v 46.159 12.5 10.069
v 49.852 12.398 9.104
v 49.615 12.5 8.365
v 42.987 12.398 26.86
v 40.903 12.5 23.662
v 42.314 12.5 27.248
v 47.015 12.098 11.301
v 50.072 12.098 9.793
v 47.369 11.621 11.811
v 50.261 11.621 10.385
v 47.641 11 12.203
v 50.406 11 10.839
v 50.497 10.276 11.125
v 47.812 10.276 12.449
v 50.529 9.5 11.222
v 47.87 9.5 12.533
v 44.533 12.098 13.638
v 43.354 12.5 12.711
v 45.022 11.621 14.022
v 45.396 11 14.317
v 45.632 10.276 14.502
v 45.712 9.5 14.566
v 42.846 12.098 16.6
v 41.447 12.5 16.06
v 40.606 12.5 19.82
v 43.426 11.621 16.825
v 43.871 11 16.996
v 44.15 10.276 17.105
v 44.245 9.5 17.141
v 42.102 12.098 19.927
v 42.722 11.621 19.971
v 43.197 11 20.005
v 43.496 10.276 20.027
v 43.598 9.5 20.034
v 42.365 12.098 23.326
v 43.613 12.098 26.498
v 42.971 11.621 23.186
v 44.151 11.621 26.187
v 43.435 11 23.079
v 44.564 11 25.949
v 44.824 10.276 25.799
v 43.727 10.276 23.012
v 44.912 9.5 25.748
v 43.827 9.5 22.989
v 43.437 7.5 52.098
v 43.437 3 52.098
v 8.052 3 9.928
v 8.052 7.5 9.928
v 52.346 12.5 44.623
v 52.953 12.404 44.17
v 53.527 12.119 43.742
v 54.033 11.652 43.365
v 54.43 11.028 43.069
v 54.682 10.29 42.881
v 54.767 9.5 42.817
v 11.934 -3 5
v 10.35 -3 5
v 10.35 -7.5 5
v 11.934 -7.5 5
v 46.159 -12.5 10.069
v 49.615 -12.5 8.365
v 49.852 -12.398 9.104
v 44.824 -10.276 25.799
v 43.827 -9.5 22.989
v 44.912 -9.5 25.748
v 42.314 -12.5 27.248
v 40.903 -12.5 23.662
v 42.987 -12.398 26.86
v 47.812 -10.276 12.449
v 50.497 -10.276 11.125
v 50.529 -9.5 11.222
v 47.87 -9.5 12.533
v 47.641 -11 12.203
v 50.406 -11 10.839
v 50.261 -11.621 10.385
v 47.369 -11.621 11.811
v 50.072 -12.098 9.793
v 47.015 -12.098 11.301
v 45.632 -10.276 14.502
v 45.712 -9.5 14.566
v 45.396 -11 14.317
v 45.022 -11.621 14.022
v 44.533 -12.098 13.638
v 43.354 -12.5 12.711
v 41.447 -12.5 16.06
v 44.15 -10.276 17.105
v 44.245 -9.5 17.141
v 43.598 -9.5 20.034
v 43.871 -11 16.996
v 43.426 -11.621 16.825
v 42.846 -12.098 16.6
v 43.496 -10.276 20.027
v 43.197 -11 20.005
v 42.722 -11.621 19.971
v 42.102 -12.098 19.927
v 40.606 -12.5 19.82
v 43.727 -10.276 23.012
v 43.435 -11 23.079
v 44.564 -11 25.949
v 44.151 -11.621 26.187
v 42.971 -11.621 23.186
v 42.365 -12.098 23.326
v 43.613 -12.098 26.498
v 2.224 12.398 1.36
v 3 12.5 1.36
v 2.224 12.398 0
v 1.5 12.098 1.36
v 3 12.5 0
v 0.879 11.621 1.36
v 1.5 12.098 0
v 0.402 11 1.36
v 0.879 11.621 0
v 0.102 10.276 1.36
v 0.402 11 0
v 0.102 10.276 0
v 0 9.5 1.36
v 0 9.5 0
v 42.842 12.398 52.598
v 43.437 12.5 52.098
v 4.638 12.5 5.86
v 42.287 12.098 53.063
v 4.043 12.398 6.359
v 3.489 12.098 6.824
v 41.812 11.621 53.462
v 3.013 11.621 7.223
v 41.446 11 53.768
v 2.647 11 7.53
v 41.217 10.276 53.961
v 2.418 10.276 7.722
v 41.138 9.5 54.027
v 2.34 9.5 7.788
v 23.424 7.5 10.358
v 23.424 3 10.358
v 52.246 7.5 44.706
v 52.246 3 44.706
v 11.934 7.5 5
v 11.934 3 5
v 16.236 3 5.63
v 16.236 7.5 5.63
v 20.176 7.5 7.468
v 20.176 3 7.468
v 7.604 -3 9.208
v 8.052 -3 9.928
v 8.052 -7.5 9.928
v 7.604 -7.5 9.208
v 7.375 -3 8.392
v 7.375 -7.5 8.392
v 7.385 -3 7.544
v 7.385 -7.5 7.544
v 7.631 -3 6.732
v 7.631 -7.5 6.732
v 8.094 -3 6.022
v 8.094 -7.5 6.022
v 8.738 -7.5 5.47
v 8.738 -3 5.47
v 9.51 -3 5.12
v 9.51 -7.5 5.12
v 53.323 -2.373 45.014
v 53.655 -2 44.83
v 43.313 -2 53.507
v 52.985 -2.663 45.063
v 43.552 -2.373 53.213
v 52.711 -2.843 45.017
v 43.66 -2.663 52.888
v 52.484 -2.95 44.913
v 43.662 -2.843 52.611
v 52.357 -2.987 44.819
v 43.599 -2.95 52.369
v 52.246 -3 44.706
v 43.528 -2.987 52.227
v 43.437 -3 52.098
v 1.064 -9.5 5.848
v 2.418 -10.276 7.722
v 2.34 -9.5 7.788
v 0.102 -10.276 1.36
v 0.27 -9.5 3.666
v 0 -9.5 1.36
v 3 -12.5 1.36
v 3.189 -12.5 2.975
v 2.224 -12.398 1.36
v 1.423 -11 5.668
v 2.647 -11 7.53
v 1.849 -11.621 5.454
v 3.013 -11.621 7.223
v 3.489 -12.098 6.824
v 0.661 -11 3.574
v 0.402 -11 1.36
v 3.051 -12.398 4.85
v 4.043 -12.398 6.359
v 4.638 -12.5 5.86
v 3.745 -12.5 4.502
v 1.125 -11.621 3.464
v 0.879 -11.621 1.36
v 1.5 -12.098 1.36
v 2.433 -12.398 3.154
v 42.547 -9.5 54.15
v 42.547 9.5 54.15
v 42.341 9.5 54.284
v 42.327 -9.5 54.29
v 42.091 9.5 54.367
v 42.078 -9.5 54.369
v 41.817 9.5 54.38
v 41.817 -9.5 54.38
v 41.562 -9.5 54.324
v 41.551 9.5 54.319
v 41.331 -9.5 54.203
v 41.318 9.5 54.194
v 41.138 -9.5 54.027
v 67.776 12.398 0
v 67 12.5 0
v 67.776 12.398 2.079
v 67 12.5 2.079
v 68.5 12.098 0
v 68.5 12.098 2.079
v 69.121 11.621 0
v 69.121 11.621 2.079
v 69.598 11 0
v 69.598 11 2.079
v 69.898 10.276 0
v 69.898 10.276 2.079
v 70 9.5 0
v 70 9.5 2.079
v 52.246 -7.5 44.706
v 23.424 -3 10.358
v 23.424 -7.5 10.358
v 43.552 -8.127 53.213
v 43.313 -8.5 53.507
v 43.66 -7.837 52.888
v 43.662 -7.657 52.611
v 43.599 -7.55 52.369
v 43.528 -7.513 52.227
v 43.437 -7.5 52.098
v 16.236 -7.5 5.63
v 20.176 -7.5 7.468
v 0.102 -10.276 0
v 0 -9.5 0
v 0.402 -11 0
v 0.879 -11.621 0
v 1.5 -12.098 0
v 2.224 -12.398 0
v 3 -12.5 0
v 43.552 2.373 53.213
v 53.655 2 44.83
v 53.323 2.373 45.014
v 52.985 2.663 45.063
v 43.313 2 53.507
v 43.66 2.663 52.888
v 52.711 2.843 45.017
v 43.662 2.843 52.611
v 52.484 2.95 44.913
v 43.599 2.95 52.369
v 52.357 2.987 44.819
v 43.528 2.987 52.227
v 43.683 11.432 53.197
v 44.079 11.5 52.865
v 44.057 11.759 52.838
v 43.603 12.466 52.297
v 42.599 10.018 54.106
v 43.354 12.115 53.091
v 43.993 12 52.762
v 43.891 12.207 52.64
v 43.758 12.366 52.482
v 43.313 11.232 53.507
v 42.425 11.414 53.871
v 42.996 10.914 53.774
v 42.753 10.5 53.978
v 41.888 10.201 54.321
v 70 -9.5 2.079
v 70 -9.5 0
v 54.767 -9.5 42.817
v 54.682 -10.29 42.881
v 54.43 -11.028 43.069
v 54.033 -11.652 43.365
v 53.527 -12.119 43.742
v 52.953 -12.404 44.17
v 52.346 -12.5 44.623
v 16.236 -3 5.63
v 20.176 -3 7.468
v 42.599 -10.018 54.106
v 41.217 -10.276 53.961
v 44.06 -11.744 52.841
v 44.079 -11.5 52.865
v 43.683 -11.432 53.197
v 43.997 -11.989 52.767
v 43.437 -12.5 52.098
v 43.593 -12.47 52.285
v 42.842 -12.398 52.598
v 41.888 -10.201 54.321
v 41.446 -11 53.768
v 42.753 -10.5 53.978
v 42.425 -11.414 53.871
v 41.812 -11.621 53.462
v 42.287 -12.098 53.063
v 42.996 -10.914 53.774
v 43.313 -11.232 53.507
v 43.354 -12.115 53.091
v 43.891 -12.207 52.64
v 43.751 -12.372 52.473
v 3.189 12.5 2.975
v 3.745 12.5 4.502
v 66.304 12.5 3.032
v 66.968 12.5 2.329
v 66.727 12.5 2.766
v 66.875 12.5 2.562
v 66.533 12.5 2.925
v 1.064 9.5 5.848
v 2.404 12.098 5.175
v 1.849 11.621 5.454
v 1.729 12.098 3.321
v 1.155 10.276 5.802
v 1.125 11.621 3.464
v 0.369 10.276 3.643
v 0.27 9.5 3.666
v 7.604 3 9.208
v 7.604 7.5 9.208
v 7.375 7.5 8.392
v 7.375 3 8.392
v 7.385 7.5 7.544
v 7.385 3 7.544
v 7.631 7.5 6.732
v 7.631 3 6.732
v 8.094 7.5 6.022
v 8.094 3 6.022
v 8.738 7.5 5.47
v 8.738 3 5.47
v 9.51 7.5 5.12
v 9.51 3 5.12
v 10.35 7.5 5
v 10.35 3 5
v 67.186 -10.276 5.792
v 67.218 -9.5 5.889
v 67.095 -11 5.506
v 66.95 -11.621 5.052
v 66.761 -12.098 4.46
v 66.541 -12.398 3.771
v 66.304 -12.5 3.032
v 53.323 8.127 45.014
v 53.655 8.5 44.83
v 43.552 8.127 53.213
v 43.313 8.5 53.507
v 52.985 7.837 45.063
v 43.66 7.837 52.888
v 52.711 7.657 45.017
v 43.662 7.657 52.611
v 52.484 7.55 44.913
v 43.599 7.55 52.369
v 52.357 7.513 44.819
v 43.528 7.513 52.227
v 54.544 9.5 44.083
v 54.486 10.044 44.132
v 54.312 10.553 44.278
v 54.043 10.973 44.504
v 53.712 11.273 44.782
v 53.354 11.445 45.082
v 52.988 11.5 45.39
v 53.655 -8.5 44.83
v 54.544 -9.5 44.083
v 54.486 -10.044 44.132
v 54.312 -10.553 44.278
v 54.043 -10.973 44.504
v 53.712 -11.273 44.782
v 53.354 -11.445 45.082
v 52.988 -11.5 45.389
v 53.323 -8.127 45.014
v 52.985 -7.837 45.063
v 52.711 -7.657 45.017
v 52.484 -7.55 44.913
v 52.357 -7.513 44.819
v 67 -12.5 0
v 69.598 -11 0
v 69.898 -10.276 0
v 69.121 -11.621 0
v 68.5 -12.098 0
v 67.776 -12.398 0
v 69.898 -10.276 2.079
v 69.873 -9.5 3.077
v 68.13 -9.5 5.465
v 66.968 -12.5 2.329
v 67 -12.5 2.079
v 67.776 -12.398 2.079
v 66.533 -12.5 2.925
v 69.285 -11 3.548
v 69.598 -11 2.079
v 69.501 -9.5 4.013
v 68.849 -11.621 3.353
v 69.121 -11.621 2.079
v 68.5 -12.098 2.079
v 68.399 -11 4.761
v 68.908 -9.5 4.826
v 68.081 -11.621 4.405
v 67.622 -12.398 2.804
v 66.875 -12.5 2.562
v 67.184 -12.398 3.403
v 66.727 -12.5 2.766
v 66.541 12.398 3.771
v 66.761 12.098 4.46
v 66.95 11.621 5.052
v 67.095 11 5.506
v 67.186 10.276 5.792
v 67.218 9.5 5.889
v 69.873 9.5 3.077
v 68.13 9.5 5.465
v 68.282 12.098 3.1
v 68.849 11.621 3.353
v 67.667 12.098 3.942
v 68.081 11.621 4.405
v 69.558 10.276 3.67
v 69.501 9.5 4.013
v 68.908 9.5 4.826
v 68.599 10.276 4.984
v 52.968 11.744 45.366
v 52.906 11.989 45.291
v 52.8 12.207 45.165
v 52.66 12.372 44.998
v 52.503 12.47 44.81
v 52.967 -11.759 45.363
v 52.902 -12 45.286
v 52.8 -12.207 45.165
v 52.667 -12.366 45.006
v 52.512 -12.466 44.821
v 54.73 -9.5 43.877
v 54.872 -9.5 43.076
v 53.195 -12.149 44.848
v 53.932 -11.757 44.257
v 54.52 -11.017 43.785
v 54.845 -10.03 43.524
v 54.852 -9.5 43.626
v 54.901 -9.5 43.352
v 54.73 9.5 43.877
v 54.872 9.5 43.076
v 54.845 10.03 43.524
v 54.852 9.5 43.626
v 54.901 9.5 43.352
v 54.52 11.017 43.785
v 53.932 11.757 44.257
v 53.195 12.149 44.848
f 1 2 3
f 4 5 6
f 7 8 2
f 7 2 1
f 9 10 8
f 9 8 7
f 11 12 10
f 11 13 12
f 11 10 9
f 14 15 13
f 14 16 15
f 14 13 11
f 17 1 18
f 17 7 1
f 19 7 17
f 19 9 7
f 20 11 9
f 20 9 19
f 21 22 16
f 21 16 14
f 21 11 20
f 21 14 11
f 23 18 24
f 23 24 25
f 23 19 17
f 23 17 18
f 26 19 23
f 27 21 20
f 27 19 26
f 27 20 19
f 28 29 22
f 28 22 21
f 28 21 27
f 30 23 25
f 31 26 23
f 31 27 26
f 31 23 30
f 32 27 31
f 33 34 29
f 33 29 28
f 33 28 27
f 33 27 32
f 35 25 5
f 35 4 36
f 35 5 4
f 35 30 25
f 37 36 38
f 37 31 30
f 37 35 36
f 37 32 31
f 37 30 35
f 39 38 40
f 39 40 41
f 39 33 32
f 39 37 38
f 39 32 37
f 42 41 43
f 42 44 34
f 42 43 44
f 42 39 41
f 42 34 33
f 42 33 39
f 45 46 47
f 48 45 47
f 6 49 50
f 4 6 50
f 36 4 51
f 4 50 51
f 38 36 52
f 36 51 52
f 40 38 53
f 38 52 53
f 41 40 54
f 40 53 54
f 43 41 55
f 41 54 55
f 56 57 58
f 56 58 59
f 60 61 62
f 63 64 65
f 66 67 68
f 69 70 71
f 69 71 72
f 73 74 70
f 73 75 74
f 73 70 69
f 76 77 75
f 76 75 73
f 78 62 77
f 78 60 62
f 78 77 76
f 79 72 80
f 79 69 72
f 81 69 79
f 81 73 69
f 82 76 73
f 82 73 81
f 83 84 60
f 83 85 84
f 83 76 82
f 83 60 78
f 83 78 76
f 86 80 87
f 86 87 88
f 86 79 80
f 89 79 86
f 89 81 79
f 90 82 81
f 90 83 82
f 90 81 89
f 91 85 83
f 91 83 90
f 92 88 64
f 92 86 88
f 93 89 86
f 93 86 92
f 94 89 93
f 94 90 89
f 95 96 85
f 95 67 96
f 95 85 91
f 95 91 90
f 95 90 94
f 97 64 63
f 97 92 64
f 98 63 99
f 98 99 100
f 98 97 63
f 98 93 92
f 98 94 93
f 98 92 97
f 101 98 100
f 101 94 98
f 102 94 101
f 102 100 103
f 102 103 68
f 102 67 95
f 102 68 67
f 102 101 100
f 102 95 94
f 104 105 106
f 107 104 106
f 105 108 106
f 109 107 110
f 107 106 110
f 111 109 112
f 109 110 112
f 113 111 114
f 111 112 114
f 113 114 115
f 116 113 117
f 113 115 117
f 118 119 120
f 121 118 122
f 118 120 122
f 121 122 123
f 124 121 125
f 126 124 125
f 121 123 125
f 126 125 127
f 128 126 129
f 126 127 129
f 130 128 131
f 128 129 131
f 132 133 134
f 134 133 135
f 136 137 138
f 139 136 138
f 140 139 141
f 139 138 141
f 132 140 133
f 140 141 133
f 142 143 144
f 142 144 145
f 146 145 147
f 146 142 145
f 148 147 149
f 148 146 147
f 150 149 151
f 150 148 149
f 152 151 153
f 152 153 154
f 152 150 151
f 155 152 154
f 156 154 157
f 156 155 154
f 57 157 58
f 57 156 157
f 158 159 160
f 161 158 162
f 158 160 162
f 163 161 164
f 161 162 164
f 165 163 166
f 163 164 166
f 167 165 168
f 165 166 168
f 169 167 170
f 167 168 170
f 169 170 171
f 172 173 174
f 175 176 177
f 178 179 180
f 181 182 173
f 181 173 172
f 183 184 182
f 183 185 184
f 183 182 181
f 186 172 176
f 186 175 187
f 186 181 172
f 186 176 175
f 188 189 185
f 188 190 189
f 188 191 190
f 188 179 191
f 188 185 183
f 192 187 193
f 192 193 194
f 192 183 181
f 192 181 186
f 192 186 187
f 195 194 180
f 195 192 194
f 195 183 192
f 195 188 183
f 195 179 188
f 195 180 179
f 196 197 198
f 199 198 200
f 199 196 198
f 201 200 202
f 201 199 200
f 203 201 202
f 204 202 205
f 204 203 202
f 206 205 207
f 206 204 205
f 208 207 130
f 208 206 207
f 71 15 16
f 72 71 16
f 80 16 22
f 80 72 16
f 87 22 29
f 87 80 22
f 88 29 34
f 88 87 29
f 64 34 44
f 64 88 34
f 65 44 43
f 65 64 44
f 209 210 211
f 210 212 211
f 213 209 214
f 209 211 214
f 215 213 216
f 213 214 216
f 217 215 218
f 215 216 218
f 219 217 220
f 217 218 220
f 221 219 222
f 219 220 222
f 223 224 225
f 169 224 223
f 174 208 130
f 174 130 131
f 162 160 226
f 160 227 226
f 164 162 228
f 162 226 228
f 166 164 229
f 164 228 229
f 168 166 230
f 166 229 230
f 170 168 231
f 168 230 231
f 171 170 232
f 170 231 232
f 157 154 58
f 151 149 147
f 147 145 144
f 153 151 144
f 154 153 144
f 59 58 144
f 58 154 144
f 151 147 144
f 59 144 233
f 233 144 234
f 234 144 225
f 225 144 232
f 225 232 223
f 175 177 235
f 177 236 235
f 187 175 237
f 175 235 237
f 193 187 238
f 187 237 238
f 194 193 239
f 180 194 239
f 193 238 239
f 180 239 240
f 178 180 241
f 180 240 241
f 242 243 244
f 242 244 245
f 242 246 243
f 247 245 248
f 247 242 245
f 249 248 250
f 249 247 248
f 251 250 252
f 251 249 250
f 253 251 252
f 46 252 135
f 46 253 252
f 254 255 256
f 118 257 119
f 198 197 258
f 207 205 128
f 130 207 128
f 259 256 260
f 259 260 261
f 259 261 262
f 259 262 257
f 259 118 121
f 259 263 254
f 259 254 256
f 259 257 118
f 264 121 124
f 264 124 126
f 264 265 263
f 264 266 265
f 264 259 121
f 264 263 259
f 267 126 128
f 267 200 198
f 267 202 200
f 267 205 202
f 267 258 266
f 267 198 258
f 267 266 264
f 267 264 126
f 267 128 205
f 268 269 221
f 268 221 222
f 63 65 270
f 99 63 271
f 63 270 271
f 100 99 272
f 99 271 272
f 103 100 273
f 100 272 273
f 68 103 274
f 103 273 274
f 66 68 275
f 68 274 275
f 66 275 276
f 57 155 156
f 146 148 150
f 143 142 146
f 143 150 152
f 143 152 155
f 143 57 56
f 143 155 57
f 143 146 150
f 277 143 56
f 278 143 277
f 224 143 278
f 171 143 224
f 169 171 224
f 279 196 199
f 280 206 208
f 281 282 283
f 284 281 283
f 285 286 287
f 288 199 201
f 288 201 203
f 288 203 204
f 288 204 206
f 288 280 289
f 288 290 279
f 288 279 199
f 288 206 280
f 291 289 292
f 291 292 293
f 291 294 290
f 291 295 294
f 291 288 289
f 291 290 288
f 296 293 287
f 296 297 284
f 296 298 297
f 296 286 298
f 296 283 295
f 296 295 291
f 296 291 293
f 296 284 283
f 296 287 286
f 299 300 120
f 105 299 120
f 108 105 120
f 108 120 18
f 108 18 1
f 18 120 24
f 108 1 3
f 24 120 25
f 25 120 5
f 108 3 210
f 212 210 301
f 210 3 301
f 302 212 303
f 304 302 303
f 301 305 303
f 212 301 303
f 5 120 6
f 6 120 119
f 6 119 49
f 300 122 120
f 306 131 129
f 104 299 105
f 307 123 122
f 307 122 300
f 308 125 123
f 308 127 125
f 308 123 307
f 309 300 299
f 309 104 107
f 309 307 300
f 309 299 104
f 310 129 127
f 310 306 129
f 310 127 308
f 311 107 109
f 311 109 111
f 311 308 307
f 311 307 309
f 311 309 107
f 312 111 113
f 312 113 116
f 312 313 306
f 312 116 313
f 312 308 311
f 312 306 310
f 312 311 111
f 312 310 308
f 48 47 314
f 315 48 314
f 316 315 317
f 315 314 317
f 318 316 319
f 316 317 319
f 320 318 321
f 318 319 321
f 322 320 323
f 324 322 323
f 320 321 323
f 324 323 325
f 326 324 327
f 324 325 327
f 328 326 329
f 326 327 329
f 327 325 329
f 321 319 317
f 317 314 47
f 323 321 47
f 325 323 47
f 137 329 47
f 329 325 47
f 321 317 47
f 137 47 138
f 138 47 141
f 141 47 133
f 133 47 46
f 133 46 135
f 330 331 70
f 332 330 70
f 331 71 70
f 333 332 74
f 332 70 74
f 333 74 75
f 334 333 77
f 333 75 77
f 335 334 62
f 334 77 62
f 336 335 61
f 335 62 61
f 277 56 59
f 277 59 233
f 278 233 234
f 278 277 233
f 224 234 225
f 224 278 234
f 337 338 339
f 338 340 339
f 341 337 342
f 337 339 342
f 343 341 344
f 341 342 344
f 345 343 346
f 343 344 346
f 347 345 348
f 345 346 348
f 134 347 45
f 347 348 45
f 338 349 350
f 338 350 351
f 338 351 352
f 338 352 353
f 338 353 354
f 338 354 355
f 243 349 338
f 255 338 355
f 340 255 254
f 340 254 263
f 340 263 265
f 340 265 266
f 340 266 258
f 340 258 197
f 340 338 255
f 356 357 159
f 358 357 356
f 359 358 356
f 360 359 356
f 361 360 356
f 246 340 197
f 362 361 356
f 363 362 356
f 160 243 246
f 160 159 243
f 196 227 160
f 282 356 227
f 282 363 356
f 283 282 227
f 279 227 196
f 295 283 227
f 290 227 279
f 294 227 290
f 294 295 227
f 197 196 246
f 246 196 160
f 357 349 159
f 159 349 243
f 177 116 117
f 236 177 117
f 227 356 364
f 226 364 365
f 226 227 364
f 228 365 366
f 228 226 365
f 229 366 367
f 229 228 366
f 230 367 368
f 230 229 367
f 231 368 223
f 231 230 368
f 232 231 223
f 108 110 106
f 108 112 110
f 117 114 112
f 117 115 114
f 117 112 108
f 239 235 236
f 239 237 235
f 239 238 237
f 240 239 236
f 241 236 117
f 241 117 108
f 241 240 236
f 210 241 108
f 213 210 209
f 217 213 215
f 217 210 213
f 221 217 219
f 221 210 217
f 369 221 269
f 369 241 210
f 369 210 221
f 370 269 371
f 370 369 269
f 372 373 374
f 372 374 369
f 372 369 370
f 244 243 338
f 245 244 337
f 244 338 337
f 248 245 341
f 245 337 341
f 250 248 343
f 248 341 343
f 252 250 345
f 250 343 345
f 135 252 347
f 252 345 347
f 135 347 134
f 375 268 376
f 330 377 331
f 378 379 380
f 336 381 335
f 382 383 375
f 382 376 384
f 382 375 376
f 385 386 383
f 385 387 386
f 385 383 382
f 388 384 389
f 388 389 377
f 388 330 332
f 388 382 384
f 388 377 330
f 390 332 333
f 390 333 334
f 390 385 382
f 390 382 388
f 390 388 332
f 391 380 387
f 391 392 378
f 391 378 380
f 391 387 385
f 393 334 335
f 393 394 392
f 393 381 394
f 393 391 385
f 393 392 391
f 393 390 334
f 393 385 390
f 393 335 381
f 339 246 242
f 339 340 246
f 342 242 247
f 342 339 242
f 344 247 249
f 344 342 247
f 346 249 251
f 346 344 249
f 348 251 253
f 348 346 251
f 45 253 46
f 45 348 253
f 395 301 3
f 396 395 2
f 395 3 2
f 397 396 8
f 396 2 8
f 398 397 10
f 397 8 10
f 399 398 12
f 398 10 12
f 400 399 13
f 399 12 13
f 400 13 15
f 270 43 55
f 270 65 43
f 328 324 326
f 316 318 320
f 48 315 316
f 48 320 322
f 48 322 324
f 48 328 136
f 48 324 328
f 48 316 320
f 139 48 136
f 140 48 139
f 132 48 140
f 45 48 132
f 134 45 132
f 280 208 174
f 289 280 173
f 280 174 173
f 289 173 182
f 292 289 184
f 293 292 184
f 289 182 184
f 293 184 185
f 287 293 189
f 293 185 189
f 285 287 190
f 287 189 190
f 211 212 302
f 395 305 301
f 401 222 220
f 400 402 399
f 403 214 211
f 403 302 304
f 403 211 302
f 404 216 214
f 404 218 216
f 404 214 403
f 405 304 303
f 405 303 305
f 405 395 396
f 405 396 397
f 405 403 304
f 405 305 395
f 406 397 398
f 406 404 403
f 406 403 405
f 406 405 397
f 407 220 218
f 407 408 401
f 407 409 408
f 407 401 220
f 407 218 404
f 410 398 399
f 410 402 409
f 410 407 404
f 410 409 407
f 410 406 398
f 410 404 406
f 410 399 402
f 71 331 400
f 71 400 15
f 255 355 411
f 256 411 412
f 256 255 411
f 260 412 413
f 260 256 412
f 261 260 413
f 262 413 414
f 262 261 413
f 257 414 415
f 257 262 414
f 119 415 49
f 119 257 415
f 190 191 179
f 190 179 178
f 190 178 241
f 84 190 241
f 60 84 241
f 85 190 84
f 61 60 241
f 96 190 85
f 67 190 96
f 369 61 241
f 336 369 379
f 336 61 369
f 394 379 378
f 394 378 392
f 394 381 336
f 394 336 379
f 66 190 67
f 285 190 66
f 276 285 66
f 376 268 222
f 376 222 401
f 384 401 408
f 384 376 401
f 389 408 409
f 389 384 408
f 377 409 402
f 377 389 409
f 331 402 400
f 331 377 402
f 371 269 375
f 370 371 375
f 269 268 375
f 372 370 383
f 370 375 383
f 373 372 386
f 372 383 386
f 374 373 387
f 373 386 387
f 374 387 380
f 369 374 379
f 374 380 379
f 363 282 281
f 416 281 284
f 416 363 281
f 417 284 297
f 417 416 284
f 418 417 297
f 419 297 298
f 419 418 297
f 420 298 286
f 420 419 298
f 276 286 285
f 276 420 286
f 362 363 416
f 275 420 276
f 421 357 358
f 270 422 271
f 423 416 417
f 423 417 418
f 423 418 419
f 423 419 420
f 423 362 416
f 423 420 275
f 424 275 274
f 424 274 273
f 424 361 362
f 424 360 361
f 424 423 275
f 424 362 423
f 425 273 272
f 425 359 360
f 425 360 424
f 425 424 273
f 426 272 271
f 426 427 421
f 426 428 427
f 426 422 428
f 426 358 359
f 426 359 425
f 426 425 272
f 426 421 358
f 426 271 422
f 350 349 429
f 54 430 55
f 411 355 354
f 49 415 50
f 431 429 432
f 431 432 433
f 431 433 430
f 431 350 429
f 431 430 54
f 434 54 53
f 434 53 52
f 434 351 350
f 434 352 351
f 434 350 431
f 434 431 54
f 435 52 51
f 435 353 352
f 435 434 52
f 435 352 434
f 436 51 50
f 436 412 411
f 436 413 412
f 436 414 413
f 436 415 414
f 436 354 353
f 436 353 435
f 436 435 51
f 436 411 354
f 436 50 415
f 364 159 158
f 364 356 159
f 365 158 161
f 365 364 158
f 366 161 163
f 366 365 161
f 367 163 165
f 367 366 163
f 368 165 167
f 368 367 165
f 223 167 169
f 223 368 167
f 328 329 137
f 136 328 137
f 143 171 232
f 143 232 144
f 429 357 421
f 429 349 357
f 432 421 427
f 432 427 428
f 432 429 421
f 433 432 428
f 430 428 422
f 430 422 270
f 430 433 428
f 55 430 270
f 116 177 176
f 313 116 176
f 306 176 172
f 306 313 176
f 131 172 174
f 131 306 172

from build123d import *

# Parameters (mm, degrees)
F1_DEPTH      = 12.5
F1_DEPTH_BACK = 12.5
F4_DEPTH      = 4.5
F5_R          = 10
F6_R          = 4
F7_R          = 3
F8_R          = 1


# Not quite as in the source:
# - a pattern or mirror of a feature is missing from the dataset's text; its kind, count and spacing are read off the source's solid


with BuildPart() as f1:
    # F0 (on Front) → F1 (new body, two sides)
    with BuildSketch(Plane.XZ) as f1_sk:
        Polygon((0, 5), (0, 0), (70, 0), (70, 5), (38.7070253131, 15), (55.1869723842, 43.5441056332), (41.7811946296, 54.7928888027), align=None)
    extrude(amount=F1_DEPTH)
    extrude(f1_sk.sketch, amount=-F1_DEPTH_BACK)

    # F3 (on offset) → F4 (cut)
    with BuildSketch(Plane.XZ.offset(3)):
        with BuildLine():
            Line((52.8888390549, 45.4724684623), (44.079327959, 52.8645259737))
            Line((44.079327959, 52.8645259737), (8.0516093002, 9.9283628291))
            ThreePointArc((8.0516093002, 9.9283628291), (7.6308192684, 6.7321452148), (10.3497426295, 5))
            Line((10.3497426295, 5), (11.933790823, 5))
            ThreePointArc((11.933790823, 5), (18.2730647491, 6.4053831945), (23.4244574698, 10.3581858547))
            Line((23.4244574698, 10.3581858547), (52.8888390549, 45.4724684623))
        make_face()
    f4 = extrude(amount=F4_DEPTH, mode=Mode.SUBTRACT)

    # F4_copies: F4 across plane
    add(f4.mirror(Plane.ZX), mode=Mode.SUBTRACT)

    # F5
    f5_edges = [f1.edges().sort_by_distance(p)[0] for p in [
        (38.707025, 0, 15),
        (0, 0, 5),
    ]]
    fillet(f5_edges, radius=F5_R)

    # F6
    f6_edges = [f1.edges().sort_by_distance(p)[0] for p in [
        (70, 0, 5),
    ]]
    fillet(f6_edges, radius=F6_R)

    # F7
    f7_edges = [f1.edges().sort_by_distance(p)[0] for p in [
        (22.060375, -12.5, 31.290531),
        (50.049611, -12.5, 34.645935),
        (50.049611, 12.5, 34.645935),
        (22.060375, 12.5, 31.290531),
        (70, -12.5, 1.039484),
        (69.230351, -12.5, 4.437958),
        (58.873064, -12.5, 8.55573),
        (0, -12.5, 0.680149),
        (44.245427, -12.5, 17.141433),
        (0.603074, -12.5, 4.780499),
        (70, 12.5, 1.039484),
        (69.230351, 12.5, 4.437958),
        (58.873064, 12.5, 8.55573),
        (0, 12.5, 0.680149),
        (44.245427, 12.5, 17.141433),
        (0.603074, 12.5, 4.780499),
    ]]
    fillet(f7_edges, radius=F7_R)

    # F8
    f8_edges = [f1.edges().sort_by_distance(p)[0] for p in [
        (55.186972, 0, 43.544106),
        (54.497154, -11.629423, 44.122932),
        (54.497154, 11.629423, 44.122932),
        (48.466357, -12.5, 49.183371),
        (48.466357, 12.5, 49.183371),
        (42.454302, -11.62132, 54.228084),
        (42.454302, 11.62132, 54.228084),
        (41.781195, 0, 54.792889),
        (52.888839, -5.25, 45.472468),
        (48.484084, -3, 49.168497),
        (48.484084, -7.5, 49.168497),
        (44.079328, -5.25, 52.864526),
        (48.484084, 3, 49.168497),
        (44.079328, 5.25, 52.864526),
        (48.484084, 7.5, 49.168497),
        (52.888839, 5.25, 45.472468),
    ]]
    fillet(f8_edges, radius=F8_R)


solid = f1.part
